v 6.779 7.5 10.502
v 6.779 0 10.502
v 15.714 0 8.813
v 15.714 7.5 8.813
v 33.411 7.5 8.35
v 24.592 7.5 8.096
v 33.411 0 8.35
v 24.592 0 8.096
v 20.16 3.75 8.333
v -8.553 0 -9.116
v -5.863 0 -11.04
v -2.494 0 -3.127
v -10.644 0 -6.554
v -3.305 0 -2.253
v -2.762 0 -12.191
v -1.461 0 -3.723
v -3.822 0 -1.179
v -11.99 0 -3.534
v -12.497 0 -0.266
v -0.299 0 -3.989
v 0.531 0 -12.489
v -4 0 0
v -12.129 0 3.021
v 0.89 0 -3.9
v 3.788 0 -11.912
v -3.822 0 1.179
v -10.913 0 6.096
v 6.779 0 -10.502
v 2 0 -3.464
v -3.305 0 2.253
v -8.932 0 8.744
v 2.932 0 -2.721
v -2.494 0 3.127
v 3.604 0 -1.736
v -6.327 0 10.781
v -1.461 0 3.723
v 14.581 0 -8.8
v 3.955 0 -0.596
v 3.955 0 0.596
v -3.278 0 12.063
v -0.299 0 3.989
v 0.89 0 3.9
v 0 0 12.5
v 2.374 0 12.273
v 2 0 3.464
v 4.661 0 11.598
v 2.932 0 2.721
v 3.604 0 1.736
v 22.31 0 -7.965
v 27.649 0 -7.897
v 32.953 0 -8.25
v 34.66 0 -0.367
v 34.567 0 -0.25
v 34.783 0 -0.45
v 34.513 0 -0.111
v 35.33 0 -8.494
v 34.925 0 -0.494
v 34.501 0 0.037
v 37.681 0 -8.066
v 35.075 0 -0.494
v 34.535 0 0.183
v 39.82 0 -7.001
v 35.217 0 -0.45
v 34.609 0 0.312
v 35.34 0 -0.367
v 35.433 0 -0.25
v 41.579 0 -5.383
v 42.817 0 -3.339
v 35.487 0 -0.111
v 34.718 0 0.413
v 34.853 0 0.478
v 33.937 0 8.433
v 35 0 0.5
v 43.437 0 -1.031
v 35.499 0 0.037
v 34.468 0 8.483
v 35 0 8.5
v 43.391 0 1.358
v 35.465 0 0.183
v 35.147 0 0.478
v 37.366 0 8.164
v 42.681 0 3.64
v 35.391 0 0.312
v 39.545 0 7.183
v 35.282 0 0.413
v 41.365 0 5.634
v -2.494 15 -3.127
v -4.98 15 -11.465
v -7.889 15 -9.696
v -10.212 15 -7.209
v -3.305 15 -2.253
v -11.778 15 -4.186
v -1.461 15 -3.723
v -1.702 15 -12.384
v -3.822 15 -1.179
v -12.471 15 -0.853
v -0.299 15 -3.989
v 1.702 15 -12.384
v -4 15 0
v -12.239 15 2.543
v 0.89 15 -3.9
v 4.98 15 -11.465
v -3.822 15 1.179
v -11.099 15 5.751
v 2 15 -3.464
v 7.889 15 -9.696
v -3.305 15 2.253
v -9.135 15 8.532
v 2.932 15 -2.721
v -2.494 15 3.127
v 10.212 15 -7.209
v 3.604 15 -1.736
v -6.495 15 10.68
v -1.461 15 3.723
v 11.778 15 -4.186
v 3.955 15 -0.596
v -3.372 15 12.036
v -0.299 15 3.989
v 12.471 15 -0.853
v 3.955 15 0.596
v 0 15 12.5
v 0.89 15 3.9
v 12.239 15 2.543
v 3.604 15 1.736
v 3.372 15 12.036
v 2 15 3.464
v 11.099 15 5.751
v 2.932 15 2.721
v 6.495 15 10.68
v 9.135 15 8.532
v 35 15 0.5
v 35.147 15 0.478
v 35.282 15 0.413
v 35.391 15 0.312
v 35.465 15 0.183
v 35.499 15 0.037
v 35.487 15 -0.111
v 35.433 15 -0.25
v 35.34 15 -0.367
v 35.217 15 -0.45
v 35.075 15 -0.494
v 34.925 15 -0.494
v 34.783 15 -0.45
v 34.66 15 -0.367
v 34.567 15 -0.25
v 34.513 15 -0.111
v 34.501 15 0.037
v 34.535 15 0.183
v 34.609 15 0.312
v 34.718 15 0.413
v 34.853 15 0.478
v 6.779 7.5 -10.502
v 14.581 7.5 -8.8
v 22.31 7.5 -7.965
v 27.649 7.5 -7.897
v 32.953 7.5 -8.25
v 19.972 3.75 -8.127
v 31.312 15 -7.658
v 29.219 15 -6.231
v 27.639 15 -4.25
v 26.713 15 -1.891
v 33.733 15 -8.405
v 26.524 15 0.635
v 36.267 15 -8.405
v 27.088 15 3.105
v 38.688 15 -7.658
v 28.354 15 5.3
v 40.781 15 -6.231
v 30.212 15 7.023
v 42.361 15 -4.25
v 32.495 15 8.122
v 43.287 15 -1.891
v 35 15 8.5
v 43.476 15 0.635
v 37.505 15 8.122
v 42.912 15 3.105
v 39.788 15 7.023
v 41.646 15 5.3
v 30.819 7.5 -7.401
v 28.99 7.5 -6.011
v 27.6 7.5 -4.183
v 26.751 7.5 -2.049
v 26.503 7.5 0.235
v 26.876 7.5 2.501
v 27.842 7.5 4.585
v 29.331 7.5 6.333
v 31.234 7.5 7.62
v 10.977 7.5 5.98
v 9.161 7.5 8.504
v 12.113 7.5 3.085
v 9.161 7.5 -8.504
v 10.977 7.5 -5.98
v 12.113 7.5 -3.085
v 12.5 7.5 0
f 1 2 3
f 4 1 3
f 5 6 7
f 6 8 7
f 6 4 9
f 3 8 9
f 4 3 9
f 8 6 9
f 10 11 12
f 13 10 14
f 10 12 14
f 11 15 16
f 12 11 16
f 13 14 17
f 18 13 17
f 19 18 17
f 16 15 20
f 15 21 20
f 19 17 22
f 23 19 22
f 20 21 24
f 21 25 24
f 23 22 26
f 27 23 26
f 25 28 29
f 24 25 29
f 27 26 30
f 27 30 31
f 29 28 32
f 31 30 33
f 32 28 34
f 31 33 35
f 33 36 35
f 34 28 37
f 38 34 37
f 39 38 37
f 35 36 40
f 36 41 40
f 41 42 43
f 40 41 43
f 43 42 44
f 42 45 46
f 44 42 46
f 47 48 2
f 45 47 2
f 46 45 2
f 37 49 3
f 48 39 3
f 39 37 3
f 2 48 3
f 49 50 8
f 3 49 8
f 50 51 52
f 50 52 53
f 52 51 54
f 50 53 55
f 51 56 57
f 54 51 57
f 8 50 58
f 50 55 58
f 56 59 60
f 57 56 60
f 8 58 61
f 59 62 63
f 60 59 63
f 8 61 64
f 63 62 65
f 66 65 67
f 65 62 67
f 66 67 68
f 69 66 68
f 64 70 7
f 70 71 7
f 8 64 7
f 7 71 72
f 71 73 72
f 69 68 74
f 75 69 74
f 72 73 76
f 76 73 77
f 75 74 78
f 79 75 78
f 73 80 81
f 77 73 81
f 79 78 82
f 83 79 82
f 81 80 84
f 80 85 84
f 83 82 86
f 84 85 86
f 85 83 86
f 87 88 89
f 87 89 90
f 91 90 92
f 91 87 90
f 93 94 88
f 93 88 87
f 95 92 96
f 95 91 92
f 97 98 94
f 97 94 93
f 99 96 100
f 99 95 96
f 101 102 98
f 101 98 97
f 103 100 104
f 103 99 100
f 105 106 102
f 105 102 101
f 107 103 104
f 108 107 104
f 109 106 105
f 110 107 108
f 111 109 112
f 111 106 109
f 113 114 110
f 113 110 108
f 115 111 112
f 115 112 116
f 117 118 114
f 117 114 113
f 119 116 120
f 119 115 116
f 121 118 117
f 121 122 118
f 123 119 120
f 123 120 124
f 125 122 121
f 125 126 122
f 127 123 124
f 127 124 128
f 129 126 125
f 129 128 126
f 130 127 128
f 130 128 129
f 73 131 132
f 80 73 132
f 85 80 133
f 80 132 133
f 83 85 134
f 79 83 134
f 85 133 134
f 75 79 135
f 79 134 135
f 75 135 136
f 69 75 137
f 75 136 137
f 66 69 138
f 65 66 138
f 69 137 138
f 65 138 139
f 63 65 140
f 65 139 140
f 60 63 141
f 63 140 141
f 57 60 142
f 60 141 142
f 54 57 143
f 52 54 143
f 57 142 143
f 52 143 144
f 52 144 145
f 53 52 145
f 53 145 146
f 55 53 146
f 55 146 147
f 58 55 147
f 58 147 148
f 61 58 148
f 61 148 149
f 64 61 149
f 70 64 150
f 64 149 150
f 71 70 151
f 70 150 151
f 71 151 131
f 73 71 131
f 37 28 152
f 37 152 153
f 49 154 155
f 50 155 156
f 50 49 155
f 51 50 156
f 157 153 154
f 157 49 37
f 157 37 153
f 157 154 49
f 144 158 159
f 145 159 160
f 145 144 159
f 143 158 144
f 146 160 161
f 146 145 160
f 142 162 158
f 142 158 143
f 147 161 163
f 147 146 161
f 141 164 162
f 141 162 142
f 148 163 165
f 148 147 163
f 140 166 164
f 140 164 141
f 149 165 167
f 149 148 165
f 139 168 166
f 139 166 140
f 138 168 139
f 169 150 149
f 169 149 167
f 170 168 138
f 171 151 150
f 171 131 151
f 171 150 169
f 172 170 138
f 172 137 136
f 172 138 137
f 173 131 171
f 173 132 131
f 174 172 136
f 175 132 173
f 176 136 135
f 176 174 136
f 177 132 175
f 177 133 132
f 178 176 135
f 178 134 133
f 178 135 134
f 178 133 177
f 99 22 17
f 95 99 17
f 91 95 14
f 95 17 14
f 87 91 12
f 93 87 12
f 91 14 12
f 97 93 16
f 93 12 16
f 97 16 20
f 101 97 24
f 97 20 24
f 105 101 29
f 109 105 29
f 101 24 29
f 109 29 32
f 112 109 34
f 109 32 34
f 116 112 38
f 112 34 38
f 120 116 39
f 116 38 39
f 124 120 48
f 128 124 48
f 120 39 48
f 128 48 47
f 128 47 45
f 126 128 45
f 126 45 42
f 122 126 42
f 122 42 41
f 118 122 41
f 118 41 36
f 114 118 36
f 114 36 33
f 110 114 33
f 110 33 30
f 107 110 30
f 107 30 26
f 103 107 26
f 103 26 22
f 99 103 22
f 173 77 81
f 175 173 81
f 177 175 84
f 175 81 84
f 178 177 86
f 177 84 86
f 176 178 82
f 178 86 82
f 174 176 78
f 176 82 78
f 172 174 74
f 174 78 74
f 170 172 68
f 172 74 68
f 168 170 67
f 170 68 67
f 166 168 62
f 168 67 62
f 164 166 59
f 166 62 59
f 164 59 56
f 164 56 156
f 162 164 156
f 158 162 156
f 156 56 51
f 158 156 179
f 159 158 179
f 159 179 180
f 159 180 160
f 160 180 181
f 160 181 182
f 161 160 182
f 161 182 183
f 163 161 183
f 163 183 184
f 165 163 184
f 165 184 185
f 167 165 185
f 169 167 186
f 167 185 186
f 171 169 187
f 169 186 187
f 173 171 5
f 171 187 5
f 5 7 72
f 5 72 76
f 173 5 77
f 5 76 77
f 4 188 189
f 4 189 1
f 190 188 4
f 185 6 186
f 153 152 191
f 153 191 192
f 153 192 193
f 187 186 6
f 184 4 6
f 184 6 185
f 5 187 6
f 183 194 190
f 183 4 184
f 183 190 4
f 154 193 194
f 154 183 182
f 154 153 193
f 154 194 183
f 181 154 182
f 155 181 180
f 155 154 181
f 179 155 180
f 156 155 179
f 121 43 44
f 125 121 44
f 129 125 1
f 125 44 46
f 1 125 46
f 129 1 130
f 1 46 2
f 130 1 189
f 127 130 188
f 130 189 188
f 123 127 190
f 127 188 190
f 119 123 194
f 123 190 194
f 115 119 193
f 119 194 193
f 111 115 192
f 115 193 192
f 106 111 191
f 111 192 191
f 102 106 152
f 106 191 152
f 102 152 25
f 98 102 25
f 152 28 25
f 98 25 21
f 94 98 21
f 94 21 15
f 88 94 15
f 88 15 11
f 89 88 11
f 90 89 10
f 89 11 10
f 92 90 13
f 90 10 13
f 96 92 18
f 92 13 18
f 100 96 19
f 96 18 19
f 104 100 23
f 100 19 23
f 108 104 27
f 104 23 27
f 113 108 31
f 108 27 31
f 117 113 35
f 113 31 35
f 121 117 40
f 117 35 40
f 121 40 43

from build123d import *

# Parameters (mm, degrees)
SZKIC1_R                    = 12.5
DODANIE_WYCI_GNI_CIE2_DEPTH = 15
SZKIC3_R                    = 8.5
DODANIE_WYCI_GNI_CIE3_DEPTH = 15
DODANIE_WYCI_GNI_CIE4_DEPTH = 7.5
OTWORY_USTALAJ_CE_8_0MM1_D  = 8
SZKIC7_R                    = 0.5
WYTNIJ_WYCI_GNI_CIE1_DEPTH  = 15


with BuildPart() as part:
    # Szkic1 → Dodanie-wyciągnięcie2 (new body)
    with BuildSketch(Plane(origin=(0, 0, 0), x_dir=(1, 0, 0), z_dir=(0, 1, 0))):
        Circle(SZKIC1_R)
    extrude(amount=DODANIE_WYCI_GNI_CIE2_DEPTH)



with BuildPart() as body_2:
    # Szkic3 → Dodanie-wyciągnięcie3 (new body)
    with BuildSketch(Plane(origin=(0, 0, 0), x_dir=(1, 0, 0), z_dir=(0, 1, 0))):
        with Locations((35, 0)):
            Circle(SZKIC3_R)
    extrude(amount=DODANIE_WYCI_GNI_CIE3_DEPTH)


with BuildPart() as part_1:
    add(part.part)

    add(body_2.part)  # Dodanie-wyciągnięcie4 merges body 2
    # Szkic4 → Dodanie-wyciągnięcie4 (add)
    with BuildSketch(Plane(origin=(0, 0, 0), x_dir=(-1, 0, 0), z_dir=(0, -1, 0))):
        with BuildLine():
            ThreePointArc((-6.778939078, 10.502189533), (-12.5, 0), (-6.778939078, -10.502189533))
            add(Edge.make_bspline(
                [(-6.778939078, -10.502189533), (-20.225507154, -7.239536671), (-33.411274741, -8.350206707)],
                knots=[0, 0, 0, 0.631379274, 0.631379274, 0.631379274], degree=2))
            ThreePointArc((-33.411274741, -8.350206707), (-26.503236916, -0.234557237), (-32.953022418, 8.249841379))
            add(Edge.make_bspline(
                [(-6.778939078, 10.502189533), (-20.078070114, 6.877362512), (-32.953022418, 8.249841379)],
                knots=[0, 0, 0, 0.617827196, 0.617827196, 0.617827196], degree=2))
        make_face()
    extrude(amount=-DODANIE_WYCI_GNI_CIE4_DEPTH)

    # Otwory ustalające Ø8.0mm1 (through all)
    with Locations(Plane(origin=(0, 15, 0), x_dir=(1, 0, 0), z_dir=(0, 1, 0))):
        with Locations((0, 0)):
            Hole(OTWORY_USTALAJ_CE_8_0MM1_D / 2)

    # Szkic7 → Wytnij-wyciągnięcie1 (cut)
    with BuildSketch(Plane(origin=(0, 15, 0), x_dir=(1, 0, 0), z_dir=(0, 1, 0))):
        with Locations((35, 0)):
            Circle(SZKIC7_R)
    extrude(amount=-WYTNIJ_WYCI_GNI_CIE1_DEPTH, mode=Mode.SUBTRACT)


solid = part_1.part
